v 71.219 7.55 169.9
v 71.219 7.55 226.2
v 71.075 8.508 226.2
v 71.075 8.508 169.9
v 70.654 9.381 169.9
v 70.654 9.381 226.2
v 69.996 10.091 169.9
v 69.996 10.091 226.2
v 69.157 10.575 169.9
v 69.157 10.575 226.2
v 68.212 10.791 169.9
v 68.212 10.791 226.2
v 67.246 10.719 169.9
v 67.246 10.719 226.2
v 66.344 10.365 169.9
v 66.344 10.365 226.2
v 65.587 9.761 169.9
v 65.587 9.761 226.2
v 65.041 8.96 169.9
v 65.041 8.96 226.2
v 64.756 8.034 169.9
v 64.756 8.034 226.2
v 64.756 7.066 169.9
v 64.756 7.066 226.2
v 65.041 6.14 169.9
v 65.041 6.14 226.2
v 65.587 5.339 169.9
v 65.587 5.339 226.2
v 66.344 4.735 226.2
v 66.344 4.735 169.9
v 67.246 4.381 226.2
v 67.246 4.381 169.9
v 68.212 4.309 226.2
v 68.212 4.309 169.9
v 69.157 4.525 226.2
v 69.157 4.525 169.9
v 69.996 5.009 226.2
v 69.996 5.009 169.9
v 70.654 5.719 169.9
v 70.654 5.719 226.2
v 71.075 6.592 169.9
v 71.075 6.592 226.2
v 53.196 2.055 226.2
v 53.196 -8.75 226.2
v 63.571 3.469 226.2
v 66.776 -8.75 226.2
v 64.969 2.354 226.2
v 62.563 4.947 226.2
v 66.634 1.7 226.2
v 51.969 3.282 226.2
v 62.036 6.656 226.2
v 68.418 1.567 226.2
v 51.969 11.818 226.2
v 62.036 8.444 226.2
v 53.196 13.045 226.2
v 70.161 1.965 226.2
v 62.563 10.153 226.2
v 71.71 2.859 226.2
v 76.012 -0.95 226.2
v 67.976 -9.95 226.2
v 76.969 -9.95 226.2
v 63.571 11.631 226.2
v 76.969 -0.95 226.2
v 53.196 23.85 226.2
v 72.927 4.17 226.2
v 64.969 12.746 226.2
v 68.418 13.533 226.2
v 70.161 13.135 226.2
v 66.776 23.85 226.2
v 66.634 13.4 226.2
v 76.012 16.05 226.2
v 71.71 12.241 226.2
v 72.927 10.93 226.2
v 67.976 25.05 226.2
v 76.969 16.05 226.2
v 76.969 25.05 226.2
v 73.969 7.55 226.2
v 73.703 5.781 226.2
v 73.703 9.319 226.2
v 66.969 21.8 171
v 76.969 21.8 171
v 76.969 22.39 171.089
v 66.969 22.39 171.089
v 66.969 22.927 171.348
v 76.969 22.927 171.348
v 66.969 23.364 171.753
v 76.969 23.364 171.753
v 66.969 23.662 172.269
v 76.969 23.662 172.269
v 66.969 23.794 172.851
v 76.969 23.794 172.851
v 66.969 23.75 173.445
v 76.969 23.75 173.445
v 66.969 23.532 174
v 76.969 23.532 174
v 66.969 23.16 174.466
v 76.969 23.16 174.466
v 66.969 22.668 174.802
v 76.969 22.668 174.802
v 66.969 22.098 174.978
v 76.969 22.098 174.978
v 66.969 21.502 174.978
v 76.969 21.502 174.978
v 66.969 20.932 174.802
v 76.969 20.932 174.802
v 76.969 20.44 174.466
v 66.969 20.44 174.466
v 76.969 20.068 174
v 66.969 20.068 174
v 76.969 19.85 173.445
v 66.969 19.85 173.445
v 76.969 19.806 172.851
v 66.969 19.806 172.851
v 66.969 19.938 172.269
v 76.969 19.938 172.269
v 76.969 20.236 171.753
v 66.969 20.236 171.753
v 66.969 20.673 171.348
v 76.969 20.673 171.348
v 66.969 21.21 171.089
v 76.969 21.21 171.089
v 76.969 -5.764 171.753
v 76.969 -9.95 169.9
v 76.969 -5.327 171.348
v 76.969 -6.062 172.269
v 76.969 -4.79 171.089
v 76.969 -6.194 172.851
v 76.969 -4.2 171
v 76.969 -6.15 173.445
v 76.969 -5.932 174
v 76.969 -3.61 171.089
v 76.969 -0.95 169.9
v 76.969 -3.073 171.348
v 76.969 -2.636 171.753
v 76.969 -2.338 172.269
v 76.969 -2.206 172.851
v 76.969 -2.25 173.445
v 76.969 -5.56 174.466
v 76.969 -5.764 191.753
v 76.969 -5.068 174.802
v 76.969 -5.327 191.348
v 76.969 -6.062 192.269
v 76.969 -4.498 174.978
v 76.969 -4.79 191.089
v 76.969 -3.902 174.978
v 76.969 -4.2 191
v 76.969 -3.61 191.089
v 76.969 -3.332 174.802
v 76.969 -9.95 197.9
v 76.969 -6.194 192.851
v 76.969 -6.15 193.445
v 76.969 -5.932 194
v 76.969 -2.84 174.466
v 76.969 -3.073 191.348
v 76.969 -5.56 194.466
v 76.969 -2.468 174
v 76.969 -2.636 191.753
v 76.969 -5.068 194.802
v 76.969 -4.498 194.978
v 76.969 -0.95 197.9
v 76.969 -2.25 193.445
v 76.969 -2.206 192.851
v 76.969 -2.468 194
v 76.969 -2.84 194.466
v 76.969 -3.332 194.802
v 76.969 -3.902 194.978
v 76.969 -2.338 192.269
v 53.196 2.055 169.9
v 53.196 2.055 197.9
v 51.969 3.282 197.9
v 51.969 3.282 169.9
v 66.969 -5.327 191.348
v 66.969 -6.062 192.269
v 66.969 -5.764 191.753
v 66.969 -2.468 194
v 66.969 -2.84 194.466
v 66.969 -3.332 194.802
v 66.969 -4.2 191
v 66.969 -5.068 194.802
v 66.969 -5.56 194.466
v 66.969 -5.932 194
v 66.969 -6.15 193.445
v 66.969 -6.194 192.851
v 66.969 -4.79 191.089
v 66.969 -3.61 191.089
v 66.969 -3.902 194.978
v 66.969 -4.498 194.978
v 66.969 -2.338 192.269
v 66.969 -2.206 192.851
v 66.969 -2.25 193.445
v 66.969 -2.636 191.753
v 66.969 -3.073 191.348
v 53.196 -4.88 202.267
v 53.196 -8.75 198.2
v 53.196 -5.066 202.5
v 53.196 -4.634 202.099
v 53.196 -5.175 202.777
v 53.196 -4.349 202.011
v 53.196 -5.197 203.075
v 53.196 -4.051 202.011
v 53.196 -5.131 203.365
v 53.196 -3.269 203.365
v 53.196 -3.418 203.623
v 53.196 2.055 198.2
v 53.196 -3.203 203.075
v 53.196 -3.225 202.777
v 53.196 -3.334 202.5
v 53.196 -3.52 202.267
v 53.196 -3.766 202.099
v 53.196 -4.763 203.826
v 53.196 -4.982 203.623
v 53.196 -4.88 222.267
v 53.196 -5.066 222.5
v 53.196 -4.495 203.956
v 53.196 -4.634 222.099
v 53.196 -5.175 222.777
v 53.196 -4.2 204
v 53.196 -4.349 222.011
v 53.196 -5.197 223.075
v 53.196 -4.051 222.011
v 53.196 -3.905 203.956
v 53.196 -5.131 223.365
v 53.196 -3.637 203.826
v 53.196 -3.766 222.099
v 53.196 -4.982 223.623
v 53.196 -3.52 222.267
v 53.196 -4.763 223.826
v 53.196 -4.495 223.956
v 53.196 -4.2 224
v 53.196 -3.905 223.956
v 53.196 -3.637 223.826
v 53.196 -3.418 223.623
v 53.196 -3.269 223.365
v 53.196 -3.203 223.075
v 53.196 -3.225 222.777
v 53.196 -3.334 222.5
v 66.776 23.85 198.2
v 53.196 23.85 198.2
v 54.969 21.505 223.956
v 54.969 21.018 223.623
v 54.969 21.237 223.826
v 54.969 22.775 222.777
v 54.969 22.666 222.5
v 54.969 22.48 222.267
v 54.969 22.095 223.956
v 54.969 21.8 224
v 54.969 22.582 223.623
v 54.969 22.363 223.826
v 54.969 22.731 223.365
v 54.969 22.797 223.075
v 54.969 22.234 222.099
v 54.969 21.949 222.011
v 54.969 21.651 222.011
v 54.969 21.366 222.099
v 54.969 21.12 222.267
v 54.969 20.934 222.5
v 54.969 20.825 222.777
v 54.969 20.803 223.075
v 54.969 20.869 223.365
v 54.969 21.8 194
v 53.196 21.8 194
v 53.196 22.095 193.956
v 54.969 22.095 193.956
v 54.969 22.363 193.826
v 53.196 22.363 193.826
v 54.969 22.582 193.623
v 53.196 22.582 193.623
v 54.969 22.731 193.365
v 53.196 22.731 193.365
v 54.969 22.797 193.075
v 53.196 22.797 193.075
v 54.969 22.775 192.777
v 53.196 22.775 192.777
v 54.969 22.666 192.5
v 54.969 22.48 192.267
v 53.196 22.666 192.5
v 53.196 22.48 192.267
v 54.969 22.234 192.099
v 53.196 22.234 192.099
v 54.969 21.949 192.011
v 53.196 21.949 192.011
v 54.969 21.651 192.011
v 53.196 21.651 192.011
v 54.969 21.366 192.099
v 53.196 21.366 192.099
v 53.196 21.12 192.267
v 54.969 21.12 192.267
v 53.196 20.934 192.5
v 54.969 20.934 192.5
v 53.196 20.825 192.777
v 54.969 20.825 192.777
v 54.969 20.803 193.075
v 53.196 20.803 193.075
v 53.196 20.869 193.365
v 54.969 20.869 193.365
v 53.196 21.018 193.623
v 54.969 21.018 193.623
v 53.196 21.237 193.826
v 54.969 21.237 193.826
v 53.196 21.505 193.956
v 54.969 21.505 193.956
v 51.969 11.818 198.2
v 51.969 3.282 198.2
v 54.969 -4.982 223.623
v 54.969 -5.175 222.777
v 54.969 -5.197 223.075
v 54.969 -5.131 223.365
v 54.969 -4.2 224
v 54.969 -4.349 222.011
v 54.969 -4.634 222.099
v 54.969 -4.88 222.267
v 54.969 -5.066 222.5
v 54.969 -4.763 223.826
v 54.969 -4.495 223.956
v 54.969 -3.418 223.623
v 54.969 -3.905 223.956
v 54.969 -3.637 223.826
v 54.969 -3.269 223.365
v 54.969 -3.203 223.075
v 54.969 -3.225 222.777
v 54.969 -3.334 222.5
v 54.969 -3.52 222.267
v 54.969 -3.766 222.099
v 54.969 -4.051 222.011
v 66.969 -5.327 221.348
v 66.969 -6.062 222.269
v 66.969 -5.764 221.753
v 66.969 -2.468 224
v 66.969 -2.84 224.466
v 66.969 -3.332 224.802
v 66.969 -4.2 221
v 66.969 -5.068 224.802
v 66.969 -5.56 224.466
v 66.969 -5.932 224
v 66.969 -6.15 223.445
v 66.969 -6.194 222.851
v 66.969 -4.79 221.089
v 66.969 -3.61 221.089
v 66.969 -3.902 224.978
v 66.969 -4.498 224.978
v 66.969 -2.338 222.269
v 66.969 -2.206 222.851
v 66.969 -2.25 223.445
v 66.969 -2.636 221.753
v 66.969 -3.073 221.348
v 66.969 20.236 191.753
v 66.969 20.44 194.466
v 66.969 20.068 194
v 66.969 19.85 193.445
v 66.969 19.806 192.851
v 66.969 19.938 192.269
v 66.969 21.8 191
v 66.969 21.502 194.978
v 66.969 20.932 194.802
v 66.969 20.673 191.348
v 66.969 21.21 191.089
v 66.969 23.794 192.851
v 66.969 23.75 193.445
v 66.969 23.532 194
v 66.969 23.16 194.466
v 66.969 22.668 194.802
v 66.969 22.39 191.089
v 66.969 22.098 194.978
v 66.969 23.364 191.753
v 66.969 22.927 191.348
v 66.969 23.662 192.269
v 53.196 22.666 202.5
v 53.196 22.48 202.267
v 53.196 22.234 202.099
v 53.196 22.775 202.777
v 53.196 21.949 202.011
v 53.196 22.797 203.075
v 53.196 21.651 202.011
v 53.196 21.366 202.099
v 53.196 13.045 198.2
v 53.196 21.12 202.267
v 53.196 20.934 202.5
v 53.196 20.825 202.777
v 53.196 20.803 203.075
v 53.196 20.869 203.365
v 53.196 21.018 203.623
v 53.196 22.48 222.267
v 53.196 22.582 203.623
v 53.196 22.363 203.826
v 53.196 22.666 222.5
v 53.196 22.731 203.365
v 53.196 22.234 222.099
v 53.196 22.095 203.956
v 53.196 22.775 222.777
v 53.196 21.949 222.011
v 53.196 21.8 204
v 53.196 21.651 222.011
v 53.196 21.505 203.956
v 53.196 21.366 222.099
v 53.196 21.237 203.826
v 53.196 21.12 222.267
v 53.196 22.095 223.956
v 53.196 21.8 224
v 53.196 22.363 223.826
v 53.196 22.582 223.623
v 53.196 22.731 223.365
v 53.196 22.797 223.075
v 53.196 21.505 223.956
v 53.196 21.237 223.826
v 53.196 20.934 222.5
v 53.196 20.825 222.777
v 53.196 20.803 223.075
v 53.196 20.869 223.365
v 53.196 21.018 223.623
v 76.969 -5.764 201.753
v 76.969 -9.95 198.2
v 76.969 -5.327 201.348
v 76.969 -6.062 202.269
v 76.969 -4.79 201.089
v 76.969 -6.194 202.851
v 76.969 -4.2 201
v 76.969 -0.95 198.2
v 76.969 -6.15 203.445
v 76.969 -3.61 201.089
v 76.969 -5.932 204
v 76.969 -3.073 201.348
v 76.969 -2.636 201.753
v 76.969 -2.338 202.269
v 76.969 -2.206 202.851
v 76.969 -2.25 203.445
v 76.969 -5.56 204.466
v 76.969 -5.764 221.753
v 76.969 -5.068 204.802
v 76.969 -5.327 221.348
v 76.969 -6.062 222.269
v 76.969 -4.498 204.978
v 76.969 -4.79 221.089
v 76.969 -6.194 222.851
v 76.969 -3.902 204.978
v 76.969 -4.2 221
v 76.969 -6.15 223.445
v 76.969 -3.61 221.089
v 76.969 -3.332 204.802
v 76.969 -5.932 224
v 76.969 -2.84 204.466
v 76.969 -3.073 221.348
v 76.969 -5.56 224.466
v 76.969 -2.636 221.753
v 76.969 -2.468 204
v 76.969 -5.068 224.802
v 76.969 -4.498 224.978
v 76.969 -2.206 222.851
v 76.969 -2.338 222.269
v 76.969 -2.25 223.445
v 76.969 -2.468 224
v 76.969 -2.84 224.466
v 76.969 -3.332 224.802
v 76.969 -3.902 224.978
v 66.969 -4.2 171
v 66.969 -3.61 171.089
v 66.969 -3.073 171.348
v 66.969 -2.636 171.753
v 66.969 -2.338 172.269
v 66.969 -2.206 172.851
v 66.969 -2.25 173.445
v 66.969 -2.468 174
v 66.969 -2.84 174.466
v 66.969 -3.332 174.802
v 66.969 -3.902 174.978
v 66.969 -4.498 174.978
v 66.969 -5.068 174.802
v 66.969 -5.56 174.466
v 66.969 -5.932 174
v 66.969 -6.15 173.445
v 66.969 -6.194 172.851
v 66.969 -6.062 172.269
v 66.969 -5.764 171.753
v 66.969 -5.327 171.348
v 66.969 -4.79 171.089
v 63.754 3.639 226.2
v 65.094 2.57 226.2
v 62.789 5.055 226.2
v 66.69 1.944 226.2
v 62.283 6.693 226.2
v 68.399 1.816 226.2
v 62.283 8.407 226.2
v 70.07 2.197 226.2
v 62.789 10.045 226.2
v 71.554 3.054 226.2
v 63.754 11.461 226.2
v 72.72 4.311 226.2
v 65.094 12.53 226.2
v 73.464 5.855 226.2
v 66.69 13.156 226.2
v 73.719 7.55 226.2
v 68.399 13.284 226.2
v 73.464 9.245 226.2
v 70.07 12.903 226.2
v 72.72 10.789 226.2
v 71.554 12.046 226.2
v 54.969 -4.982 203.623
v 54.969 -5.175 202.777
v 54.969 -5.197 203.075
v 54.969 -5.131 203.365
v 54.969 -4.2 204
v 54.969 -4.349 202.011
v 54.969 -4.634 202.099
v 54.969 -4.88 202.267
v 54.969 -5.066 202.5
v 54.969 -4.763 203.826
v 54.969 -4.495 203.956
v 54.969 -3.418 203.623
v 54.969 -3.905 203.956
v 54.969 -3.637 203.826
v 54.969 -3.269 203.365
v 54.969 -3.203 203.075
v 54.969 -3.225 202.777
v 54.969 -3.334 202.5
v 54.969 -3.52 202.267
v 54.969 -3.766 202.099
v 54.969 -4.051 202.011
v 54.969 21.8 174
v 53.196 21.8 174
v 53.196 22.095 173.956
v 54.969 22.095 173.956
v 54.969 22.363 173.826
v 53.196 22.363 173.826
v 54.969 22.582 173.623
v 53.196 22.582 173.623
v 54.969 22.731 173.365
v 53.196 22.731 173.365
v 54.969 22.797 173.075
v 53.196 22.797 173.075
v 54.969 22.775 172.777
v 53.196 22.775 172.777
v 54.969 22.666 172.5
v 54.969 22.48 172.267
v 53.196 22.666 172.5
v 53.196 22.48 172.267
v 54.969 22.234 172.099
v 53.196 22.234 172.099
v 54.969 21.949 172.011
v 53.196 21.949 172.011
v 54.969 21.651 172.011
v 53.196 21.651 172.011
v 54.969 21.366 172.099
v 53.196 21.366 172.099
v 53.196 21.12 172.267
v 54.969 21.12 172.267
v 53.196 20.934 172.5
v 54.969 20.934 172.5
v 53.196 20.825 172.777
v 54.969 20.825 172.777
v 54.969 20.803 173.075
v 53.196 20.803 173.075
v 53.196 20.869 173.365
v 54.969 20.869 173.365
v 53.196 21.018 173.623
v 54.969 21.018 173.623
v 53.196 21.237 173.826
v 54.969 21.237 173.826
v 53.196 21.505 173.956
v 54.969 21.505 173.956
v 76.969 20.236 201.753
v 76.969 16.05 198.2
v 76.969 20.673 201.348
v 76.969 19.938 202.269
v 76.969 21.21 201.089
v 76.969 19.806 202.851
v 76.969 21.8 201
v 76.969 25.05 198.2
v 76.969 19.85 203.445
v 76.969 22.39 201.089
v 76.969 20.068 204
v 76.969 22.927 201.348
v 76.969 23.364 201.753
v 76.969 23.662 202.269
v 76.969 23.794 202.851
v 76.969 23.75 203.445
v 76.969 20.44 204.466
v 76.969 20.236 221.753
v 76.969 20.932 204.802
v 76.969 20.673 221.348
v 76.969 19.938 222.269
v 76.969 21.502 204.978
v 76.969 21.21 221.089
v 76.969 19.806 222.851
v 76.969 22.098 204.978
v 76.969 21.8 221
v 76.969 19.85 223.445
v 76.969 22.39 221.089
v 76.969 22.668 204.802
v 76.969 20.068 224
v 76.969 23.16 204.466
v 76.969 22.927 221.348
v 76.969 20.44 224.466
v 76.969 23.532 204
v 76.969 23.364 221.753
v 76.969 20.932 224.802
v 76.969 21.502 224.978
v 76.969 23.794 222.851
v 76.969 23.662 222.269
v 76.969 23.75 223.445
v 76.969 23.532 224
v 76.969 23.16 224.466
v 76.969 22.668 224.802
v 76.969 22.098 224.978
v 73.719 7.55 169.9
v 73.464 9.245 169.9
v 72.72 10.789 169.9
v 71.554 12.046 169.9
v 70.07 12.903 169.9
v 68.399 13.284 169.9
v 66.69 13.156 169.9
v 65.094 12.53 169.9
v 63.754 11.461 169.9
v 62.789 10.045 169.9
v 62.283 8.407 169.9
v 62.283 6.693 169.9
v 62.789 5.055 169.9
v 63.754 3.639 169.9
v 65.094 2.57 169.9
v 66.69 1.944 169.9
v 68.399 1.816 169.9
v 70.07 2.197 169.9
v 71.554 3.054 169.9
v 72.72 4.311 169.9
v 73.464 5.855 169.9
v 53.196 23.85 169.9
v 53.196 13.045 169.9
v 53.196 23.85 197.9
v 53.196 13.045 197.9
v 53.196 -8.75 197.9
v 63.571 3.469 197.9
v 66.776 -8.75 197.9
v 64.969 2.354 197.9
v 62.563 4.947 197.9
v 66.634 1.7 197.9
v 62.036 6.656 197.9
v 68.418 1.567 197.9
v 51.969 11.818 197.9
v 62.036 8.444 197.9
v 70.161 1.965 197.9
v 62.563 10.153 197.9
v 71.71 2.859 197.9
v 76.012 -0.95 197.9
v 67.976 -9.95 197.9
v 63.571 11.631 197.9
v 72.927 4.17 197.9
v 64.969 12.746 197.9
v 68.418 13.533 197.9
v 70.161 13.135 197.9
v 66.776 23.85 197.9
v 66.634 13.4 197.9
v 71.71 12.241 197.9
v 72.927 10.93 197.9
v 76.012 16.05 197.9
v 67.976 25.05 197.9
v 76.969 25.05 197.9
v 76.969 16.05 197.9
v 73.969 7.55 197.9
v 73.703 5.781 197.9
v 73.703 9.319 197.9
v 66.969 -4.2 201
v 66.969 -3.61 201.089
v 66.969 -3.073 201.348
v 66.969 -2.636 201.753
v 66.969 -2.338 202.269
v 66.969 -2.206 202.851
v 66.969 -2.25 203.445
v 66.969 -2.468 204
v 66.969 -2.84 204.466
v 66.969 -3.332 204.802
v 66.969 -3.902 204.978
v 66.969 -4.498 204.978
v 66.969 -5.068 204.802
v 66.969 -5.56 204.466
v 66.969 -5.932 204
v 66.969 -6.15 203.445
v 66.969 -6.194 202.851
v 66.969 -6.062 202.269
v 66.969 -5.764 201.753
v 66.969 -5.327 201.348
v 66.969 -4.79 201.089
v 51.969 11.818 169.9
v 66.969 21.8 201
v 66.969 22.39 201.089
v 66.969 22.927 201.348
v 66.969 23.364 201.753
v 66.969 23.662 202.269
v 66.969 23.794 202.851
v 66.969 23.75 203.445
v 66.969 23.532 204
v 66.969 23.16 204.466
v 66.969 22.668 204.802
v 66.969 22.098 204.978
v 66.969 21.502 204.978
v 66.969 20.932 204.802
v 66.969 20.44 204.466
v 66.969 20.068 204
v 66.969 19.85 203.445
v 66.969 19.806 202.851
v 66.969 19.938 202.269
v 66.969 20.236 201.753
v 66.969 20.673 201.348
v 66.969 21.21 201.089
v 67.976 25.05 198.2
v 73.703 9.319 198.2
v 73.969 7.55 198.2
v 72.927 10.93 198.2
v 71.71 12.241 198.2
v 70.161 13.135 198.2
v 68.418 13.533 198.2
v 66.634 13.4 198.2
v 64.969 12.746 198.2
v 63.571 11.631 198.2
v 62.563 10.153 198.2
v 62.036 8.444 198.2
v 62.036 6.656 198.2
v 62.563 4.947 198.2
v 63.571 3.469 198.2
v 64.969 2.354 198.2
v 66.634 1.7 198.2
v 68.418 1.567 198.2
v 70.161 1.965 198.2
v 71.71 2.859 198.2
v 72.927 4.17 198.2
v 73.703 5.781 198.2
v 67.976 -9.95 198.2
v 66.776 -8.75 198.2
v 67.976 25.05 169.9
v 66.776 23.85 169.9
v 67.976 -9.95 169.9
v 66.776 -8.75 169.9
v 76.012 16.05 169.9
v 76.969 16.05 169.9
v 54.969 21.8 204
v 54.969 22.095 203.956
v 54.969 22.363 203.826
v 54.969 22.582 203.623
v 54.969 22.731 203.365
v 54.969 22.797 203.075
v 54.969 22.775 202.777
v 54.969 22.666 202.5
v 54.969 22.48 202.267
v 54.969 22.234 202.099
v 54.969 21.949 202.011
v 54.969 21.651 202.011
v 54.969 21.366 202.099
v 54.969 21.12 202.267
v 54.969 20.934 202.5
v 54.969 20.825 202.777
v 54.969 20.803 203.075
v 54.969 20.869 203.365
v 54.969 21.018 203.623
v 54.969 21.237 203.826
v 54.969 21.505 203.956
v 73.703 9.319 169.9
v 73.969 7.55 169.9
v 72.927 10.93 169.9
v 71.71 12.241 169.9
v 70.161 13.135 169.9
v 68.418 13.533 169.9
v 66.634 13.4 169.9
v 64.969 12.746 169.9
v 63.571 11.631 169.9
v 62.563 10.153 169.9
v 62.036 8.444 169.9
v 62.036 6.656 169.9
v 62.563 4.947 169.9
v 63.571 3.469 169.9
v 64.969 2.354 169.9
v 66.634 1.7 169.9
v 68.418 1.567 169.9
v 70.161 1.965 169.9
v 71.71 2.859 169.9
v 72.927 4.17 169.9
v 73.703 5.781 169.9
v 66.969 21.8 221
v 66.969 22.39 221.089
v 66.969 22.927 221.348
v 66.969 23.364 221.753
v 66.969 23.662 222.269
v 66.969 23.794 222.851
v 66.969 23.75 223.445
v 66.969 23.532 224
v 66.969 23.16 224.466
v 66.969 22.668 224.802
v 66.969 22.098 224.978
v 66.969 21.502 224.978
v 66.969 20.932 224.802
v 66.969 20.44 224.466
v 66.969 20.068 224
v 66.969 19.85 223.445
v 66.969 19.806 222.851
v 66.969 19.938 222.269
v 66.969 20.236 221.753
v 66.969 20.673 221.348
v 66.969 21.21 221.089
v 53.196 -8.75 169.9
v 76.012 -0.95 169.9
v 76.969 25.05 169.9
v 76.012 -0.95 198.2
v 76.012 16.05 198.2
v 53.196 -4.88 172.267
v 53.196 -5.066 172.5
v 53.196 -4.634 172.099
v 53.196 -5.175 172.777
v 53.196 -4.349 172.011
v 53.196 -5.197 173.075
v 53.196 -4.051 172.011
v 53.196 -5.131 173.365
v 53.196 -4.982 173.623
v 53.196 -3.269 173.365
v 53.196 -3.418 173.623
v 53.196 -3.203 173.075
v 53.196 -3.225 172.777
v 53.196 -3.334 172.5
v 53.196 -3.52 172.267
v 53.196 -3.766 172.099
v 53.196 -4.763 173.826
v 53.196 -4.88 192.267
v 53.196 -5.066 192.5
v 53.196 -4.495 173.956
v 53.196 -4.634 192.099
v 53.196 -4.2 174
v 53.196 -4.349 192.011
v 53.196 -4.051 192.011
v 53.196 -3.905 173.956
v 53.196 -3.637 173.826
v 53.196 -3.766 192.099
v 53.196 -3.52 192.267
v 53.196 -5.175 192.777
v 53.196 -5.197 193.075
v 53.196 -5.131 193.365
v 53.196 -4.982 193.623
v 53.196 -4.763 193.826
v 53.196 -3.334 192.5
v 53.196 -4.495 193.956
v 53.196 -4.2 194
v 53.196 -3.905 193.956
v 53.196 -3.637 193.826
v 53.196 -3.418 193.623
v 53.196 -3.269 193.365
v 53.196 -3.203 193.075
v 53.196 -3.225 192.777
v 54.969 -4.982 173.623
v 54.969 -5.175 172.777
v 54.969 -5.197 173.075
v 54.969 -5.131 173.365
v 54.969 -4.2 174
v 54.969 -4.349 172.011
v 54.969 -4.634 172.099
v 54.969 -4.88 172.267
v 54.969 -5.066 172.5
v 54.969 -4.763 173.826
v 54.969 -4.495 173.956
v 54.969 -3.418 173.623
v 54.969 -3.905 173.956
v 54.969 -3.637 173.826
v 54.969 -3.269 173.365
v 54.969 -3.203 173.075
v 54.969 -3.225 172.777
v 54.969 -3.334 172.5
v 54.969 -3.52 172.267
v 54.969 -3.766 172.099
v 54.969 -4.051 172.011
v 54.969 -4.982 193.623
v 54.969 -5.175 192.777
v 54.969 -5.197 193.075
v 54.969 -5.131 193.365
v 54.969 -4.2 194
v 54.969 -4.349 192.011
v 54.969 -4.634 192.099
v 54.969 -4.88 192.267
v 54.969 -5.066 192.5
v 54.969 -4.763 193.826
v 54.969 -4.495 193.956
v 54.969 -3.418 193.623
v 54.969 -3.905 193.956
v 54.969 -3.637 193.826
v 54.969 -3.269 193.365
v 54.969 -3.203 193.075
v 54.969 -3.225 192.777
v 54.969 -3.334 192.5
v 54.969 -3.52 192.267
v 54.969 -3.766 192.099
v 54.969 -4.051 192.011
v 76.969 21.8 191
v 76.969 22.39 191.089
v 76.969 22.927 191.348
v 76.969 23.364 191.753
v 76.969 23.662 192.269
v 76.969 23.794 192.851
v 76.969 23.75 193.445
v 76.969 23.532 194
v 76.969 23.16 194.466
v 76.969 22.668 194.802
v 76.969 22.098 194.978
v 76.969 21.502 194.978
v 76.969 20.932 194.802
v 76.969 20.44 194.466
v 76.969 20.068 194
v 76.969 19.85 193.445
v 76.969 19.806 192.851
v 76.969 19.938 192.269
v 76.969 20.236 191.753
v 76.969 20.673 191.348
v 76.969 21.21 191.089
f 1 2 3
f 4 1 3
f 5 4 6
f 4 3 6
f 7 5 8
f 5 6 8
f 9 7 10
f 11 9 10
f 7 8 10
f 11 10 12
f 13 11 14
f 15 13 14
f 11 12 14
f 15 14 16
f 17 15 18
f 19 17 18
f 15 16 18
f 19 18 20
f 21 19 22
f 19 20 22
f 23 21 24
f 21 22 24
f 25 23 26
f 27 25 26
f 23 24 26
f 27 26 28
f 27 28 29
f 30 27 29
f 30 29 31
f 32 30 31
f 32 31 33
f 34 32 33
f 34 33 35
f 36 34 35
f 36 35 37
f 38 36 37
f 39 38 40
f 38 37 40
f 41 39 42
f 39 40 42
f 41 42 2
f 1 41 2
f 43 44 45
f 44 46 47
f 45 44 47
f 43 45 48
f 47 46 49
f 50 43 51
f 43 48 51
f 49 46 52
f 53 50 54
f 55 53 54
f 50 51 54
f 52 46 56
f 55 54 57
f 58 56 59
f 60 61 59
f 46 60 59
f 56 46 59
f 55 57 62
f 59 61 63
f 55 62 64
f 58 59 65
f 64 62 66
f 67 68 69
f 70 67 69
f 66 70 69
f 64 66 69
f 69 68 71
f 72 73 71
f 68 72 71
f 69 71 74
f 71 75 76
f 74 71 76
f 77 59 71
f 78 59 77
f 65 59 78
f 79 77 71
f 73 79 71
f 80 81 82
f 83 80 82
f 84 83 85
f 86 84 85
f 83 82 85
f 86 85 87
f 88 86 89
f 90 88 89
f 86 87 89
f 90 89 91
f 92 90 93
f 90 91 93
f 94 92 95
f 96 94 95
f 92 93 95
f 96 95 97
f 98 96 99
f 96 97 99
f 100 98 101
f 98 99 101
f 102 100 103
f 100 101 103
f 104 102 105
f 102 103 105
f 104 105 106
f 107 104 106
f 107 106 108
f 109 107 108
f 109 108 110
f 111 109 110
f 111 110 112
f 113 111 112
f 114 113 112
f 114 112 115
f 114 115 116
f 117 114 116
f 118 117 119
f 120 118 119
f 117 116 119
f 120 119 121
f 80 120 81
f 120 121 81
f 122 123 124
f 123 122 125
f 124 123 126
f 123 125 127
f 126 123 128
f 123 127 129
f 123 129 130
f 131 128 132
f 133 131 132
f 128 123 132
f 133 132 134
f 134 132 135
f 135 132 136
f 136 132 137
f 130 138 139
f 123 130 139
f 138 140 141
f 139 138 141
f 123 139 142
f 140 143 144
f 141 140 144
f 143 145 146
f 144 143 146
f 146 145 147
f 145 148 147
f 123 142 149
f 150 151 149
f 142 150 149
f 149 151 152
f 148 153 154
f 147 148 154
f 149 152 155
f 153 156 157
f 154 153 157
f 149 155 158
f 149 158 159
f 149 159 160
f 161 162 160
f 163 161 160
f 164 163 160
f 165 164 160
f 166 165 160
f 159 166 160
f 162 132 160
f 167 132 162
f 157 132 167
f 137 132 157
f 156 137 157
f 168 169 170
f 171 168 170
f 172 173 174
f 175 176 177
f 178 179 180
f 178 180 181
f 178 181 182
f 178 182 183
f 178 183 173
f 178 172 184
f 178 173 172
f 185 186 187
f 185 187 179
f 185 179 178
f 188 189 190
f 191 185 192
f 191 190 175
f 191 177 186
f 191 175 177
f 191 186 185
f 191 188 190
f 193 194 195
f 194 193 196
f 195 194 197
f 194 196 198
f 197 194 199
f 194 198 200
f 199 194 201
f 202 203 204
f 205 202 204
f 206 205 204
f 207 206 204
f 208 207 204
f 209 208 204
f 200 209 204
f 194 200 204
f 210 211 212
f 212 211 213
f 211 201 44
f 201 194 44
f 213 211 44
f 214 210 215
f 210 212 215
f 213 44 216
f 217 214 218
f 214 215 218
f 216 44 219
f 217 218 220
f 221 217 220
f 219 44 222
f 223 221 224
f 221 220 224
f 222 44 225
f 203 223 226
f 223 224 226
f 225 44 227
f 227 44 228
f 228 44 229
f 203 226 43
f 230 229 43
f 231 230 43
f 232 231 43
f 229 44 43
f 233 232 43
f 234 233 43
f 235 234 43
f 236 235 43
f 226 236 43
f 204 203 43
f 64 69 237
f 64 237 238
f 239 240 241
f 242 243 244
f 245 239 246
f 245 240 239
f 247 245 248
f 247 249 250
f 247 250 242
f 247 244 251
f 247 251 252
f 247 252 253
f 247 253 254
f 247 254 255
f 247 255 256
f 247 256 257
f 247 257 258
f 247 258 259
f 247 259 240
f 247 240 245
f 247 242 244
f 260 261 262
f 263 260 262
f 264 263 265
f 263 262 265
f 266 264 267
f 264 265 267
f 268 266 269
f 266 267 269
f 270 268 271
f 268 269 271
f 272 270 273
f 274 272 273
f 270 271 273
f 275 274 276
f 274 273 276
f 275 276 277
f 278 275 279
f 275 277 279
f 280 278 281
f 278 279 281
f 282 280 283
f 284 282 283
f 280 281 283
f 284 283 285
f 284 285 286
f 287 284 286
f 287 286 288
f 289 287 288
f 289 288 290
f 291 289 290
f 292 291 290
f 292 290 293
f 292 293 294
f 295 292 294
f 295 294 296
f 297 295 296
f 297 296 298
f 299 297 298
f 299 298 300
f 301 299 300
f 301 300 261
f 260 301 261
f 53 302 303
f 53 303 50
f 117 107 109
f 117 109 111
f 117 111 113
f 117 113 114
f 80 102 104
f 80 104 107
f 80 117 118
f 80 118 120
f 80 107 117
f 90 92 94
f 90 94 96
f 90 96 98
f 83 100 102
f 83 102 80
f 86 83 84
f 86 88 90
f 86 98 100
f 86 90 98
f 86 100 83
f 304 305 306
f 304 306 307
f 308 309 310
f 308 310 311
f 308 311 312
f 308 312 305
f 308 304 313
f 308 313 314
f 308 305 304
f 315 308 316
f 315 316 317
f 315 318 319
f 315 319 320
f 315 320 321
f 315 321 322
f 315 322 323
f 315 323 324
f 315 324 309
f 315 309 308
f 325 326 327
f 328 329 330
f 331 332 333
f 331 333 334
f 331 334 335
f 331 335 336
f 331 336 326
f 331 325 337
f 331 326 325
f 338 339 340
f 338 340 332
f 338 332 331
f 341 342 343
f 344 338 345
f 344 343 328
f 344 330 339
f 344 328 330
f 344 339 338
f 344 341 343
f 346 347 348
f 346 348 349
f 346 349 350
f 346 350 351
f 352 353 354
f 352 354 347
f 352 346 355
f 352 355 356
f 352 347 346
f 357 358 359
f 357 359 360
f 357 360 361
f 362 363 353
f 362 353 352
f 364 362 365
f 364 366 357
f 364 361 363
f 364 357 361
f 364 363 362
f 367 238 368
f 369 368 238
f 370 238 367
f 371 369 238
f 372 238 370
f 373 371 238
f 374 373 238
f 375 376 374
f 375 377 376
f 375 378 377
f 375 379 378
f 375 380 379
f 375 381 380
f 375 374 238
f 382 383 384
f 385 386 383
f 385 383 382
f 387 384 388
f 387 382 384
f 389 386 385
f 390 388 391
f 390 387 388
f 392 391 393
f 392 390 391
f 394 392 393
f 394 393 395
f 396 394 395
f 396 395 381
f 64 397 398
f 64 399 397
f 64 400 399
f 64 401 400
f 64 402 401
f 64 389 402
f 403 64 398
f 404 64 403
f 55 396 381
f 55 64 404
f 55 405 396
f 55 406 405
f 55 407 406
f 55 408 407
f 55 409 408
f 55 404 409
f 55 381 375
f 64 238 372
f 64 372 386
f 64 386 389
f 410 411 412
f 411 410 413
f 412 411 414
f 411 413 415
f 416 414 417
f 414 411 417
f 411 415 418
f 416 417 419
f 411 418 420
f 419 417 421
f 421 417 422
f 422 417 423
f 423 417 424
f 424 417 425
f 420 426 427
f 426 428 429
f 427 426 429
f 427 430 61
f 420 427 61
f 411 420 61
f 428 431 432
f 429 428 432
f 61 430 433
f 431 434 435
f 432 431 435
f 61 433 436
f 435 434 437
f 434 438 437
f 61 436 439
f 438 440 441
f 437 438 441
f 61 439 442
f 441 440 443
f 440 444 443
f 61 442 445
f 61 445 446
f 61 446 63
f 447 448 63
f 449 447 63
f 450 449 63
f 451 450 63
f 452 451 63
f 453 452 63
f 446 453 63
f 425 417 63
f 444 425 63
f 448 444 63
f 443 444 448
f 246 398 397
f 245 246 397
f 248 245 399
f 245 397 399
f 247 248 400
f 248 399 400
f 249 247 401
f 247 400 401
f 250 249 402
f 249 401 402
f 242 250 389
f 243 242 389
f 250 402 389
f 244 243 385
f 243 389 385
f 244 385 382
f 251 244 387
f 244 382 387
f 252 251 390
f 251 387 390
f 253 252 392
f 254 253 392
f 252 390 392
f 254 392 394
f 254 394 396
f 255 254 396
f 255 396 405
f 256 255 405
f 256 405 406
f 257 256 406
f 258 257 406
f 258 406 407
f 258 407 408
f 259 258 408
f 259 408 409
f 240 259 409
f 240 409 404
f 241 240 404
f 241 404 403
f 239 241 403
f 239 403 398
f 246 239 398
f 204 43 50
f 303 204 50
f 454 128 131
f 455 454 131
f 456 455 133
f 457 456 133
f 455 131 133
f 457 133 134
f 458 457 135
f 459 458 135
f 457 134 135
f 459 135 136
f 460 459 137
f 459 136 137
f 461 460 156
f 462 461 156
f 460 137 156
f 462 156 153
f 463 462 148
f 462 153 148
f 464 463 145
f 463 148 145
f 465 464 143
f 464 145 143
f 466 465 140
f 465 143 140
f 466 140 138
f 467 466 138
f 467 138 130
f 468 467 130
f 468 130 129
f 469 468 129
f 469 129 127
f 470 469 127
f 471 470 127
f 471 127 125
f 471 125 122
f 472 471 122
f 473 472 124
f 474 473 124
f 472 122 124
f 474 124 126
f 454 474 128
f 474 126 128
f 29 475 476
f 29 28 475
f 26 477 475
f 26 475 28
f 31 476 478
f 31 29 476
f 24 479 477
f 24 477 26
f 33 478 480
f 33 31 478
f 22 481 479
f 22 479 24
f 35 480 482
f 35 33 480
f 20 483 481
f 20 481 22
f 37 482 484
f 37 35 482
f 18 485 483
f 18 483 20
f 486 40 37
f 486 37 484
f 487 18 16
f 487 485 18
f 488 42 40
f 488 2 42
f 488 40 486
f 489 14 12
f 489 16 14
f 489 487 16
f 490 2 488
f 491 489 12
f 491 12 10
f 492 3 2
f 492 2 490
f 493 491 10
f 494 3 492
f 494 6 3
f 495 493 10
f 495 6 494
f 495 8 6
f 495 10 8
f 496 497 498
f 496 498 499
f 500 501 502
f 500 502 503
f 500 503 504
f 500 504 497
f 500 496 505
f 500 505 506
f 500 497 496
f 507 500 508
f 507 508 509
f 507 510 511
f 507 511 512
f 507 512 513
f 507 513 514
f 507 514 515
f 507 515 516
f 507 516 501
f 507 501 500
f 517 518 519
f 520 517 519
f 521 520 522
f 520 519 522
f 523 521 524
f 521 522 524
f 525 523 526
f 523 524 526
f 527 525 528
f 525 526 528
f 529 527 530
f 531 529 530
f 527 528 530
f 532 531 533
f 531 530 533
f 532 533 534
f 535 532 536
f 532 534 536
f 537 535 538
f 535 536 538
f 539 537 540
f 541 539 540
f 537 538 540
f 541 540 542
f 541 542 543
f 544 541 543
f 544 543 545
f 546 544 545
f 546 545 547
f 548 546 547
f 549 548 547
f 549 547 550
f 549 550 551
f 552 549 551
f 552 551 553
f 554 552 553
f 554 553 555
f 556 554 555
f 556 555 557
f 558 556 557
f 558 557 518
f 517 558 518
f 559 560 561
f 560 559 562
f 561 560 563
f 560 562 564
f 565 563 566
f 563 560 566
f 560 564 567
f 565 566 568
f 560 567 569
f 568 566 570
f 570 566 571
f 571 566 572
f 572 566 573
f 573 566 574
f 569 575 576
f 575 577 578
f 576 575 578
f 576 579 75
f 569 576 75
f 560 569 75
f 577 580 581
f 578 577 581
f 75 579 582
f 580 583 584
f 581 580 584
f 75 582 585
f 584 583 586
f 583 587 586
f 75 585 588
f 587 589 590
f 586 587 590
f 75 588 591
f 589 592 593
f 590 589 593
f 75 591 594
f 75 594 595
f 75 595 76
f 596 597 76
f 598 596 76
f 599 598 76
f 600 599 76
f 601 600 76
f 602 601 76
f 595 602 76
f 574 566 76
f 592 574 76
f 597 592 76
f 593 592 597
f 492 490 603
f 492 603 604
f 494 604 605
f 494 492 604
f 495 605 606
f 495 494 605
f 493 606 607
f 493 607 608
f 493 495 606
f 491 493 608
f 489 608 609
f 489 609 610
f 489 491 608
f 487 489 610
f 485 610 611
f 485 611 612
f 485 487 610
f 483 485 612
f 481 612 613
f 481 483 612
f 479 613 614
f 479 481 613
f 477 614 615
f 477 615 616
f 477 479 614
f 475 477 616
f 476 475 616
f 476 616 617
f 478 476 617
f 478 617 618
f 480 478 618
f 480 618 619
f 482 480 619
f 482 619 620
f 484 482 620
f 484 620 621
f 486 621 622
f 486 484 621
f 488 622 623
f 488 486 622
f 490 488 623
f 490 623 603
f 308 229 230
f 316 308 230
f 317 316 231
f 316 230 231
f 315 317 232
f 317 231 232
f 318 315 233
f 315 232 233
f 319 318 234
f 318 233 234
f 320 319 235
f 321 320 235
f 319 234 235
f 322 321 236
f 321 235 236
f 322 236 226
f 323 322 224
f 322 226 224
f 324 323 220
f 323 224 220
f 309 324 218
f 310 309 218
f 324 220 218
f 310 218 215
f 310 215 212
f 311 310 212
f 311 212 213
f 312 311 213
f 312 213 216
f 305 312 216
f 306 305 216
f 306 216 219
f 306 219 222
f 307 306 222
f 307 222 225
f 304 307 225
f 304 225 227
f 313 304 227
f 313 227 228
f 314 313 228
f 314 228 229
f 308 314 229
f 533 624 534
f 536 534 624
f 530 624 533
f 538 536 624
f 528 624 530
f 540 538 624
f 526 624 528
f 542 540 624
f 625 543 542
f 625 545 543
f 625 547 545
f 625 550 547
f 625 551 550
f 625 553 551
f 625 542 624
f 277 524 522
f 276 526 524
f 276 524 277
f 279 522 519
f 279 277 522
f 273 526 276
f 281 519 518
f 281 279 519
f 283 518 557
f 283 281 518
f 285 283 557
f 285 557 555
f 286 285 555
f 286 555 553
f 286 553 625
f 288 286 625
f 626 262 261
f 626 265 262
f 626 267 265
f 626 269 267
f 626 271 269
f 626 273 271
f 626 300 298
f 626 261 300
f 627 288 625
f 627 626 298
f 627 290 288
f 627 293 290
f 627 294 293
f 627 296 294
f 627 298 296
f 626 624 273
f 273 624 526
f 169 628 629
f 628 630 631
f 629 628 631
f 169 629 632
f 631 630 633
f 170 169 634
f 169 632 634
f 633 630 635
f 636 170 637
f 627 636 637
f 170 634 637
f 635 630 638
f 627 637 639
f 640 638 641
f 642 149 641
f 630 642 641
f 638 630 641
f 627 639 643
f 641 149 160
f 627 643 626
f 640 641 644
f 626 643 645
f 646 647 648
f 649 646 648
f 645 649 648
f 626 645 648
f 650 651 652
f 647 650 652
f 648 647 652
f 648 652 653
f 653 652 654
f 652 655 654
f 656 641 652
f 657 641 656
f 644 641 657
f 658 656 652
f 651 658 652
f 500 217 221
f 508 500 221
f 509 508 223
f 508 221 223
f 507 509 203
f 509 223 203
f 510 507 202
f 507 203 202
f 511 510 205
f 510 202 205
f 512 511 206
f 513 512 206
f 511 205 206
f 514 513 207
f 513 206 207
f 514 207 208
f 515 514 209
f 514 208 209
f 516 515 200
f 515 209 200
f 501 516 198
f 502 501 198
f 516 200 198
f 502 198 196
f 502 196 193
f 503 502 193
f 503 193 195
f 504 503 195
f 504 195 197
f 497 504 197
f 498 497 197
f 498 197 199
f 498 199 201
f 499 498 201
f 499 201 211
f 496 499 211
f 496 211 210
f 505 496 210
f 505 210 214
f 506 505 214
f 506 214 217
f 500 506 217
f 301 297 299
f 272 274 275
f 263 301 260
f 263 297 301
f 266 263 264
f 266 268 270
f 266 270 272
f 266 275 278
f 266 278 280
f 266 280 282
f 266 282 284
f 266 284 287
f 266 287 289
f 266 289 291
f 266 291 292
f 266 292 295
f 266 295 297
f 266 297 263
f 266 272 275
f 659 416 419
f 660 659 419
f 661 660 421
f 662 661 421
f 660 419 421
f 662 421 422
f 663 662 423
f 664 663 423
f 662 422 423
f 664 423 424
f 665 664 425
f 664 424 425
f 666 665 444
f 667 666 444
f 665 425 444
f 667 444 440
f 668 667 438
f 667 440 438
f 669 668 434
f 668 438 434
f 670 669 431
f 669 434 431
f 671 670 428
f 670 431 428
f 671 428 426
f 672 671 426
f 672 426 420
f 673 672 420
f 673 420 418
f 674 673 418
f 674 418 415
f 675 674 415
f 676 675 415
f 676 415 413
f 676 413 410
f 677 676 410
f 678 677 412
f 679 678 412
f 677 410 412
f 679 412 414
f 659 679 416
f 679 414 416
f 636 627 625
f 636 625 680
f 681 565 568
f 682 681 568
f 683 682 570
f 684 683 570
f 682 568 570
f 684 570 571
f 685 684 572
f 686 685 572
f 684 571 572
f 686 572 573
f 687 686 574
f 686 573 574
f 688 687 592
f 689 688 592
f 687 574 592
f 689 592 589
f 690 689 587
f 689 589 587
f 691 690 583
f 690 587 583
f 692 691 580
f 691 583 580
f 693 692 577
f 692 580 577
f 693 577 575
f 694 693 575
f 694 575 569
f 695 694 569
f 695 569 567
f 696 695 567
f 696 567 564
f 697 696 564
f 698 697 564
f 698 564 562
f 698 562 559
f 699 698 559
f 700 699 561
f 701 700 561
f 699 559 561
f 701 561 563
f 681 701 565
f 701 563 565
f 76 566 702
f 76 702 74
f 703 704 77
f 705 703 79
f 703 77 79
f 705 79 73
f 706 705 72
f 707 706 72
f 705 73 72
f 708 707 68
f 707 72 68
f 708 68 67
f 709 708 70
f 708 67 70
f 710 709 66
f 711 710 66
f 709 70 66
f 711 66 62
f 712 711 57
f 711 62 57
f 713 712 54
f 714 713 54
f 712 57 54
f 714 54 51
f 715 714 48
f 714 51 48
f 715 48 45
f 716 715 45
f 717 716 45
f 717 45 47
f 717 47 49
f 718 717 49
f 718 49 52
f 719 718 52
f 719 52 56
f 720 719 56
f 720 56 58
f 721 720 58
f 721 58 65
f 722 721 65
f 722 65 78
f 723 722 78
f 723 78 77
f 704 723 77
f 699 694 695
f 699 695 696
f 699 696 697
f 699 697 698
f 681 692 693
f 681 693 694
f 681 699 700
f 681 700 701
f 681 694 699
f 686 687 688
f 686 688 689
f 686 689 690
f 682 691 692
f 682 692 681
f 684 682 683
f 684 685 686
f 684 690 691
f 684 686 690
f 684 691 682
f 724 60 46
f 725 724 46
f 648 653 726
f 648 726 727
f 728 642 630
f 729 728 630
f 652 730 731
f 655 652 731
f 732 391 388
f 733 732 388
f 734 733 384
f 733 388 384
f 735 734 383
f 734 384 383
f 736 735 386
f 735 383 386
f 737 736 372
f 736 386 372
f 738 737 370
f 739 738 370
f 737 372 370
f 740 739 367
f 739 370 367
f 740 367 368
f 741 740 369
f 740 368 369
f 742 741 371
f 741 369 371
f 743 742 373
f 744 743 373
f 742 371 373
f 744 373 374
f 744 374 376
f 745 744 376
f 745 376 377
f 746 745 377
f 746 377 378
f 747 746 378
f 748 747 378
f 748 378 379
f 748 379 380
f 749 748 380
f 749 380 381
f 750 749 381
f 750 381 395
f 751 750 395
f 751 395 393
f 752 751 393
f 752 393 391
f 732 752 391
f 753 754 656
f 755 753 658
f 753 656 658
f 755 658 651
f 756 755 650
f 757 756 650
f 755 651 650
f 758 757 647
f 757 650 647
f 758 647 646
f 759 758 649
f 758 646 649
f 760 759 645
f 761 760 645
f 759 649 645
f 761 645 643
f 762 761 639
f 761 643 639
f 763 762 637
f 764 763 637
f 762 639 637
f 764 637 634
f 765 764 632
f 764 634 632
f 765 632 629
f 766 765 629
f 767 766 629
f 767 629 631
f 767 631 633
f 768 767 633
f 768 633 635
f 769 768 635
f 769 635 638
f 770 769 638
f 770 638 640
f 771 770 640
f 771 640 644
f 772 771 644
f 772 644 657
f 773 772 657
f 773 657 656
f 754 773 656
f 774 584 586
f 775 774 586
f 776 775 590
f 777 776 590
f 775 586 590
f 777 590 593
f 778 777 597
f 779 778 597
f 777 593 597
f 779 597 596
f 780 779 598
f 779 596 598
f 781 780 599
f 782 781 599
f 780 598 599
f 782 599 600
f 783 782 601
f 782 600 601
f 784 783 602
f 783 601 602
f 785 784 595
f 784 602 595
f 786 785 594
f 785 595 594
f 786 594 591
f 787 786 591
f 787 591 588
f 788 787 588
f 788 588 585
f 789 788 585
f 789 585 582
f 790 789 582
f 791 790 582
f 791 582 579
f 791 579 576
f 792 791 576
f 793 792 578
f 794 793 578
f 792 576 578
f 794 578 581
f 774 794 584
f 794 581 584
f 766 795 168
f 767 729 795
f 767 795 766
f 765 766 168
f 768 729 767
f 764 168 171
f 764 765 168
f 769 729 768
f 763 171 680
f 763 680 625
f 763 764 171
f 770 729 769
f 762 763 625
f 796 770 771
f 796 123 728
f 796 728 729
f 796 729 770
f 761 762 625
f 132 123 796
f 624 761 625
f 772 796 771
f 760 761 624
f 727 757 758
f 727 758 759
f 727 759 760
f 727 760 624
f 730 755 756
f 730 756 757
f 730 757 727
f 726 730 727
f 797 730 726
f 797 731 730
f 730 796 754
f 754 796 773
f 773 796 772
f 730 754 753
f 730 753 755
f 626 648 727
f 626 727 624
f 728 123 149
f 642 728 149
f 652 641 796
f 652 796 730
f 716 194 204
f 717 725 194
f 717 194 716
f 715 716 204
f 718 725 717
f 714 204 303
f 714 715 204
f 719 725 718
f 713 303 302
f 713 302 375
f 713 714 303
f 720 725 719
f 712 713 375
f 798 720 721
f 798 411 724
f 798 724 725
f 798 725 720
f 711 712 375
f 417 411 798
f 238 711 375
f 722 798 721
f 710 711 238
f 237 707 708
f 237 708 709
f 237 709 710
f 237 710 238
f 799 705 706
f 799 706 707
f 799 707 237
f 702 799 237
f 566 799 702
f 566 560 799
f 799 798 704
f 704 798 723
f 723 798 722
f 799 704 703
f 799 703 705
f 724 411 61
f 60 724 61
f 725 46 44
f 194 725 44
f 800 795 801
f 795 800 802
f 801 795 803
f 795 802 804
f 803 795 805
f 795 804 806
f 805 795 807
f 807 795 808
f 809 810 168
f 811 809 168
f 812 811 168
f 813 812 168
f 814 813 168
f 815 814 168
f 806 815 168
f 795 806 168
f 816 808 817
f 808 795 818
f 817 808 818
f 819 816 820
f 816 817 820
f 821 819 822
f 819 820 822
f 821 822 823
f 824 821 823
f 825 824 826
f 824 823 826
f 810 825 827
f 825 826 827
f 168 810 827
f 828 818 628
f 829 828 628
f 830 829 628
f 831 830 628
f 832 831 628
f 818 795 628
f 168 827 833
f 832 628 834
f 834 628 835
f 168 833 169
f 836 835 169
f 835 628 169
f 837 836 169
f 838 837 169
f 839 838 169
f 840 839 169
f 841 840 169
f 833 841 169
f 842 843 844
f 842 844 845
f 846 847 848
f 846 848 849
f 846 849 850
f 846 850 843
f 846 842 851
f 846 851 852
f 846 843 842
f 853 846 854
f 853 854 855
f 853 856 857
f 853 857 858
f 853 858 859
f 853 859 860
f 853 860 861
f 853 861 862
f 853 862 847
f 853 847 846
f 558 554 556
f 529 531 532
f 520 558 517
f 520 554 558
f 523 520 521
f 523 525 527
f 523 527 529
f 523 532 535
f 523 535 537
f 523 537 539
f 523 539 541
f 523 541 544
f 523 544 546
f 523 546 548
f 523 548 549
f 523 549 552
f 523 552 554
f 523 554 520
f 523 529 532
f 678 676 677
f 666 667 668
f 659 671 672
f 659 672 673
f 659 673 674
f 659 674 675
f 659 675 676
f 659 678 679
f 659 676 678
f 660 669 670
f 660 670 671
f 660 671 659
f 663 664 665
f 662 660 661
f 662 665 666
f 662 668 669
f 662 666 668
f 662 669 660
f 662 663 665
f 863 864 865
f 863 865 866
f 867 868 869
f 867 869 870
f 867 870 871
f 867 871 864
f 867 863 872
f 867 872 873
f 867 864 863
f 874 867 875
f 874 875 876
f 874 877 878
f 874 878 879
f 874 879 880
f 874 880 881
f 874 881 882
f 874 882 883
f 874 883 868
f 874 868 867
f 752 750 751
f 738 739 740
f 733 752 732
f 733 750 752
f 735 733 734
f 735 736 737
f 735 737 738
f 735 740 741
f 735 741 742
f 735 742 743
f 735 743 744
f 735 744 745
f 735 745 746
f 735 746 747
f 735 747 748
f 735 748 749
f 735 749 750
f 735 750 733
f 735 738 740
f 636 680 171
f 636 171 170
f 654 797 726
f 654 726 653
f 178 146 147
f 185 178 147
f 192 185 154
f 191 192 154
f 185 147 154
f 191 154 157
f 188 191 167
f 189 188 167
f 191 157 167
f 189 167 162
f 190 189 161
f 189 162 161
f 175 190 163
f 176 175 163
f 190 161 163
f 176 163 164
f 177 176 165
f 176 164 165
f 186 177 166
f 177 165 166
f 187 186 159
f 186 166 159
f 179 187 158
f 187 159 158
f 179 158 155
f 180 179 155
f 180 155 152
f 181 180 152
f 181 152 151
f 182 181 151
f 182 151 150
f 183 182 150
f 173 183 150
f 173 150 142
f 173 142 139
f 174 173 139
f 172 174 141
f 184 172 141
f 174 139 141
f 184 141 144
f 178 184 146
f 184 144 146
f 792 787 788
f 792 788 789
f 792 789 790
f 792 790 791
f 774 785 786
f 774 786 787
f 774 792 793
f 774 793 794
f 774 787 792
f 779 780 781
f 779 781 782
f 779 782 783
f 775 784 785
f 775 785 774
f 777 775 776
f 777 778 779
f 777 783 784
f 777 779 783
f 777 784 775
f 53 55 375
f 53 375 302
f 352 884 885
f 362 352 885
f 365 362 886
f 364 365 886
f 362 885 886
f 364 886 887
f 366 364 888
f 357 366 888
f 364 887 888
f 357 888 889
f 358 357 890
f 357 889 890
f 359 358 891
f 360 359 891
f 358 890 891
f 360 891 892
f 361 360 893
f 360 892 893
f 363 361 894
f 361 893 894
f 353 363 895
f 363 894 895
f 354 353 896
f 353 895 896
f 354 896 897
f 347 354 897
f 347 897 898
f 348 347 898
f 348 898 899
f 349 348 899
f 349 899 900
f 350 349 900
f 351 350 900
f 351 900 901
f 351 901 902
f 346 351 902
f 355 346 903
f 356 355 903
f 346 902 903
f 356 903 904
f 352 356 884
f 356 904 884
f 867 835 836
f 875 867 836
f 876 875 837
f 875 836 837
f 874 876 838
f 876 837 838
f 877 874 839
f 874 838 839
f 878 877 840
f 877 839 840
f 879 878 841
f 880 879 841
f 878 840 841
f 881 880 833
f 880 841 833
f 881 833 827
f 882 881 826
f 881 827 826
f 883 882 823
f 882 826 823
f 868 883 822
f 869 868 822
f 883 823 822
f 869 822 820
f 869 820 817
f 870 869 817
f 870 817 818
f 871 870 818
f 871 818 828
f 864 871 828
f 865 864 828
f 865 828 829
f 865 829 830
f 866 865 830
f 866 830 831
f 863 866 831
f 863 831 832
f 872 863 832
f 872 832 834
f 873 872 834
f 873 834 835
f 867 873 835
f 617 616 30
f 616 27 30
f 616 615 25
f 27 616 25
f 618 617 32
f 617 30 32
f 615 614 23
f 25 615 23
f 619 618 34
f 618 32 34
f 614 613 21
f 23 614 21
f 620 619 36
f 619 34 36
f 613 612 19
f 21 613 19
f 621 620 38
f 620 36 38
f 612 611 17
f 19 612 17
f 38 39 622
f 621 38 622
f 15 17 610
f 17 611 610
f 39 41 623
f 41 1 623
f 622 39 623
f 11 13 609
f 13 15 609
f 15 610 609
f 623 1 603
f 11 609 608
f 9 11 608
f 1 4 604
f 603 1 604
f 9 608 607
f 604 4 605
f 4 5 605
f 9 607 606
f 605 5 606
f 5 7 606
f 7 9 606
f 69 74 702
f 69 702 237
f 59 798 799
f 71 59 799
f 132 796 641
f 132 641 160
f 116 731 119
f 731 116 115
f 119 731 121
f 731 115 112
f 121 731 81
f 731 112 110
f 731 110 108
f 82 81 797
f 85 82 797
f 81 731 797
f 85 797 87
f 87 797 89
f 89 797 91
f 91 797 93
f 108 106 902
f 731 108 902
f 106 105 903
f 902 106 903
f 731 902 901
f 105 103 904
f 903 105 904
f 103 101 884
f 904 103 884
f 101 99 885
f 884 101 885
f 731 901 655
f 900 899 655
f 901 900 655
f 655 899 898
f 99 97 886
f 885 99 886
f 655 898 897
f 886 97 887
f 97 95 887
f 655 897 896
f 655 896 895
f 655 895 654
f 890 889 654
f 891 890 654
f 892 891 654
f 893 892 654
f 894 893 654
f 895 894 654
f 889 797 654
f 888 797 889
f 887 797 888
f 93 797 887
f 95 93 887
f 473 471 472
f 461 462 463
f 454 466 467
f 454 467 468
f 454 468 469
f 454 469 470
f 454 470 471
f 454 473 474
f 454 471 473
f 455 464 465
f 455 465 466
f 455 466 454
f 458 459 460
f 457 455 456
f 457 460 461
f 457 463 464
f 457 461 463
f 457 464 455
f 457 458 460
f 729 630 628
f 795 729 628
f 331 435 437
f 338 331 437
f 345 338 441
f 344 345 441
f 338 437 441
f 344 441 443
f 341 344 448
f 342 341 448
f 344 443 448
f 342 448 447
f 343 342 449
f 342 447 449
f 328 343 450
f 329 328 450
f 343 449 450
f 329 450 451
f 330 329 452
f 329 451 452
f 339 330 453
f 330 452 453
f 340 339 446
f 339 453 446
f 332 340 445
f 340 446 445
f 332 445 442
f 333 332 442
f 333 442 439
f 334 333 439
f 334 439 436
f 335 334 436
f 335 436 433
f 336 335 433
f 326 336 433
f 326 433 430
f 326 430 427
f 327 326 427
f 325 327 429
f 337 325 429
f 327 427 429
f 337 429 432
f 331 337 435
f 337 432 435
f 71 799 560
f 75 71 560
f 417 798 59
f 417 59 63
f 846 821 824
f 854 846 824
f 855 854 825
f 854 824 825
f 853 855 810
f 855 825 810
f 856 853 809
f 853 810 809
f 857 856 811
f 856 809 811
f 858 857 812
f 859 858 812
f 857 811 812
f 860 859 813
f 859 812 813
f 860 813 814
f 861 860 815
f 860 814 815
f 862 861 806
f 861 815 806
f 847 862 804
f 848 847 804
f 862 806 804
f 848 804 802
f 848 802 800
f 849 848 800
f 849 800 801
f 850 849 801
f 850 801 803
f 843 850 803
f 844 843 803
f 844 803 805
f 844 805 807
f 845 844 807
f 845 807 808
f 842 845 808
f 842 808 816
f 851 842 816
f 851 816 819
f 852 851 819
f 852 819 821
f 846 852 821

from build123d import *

# Parameters (mm, degrees)
SKETCH1_W             = 28
SKETCH1_H             = 35
BOSS_EXTRUDE1_DEPTH   = 25
BOSS_EXTRUDE1_2_DEPTH = 25
SKETCH4_R             = 2
CUT_EXTRUDE1_DEPTH    = 10
SKETCH5_R             = 1
CUT_EXTRUDE2_DEPTH    = 3
SKETCH6_R             = 6
CUT_EXTRUDE3_DEPTH    = 82
SKETCH7_W             = 0.957204126
SKETCH7_H             = 17
CUT_EXTRUDE4_DEPTH    = 82
CUT_EXTRUDE5_DEPTH    = 82
SKETCH9_R             = 5.75
SKETCH9_R_2           = 3.25
BOSS_EXTRUDE2_DEPTH   = 56.3


with BuildPart() as part:
    # Sketch1 → Boss-Extrude1 (new body)
    with BuildSketch(Plane.ZY.offset(-76.969208633)):
        with Locations((212.2, 7.55)):
            Rectangle(SKETCH1_W, SKETCH1_H)
    extrude(amount=BOSS_EXTRUDE1_DEPTH)


with BuildPart() as body_2:
    # Sketch1 → Boss-Extrude1 2 (new body)
    with BuildSketch(Plane.ZY.offset(-76.969208633)):
        with Locations((183.9, 7.55)):
            Rectangle(SKETCH1_W, SKETCH1_H)
    extrude(amount=BOSS_EXTRUDE1_2_DEPTH)


with BuildPart() as cut_extrude1_tool:
    # Sketch4 → Cut-Extrude1 (new body)
    with BuildSketch(Plane(origin=(76.969208633, 0, 0), x_dir=(0, 0, -1), z_dir=(1, 0, 0))):
        with Locations((-193, 21.8)):
            Circle(SKETCH4_R)
        with Locations((-173, 21.8)):
            Circle(SKETCH4_R)
        with Locations((-173, -4.2)):
            Circle(SKETCH4_R)
        with Locations((-193, -4.2)):
            Circle(SKETCH4_R)
        with Locations((-223, -4.2)):
            Circle(SKETCH4_R)
        with Locations((-203, -4.2)):
            Circle(SKETCH4_R)
        with Locations((-203, 21.8)):
            Circle(SKETCH4_R)
        with Locations((-223, 21.8)):
            Circle(SKETCH4_R)
    extrude(amount=-CUT_EXTRUDE1_DEPTH)


with BuildPart() as part_1:
    add(part.part)

    # Cut-Extrude1: cut by cut_extrude1_tool
    add(cut_extrude1_tool.part, mode=Mode.SUBTRACT)


with BuildPart() as body_2_1:
    add(body_2.part)

    # Cut-Extrude1: cut by cut_extrude1_tool
    add(cut_extrude1_tool.part, mode=Mode.SUBTRACT)


with BuildPart() as cut_extrude2_tool:
    # Sketch5 → Cut-Extrude2 (new body)
    with BuildSketch(Plane.ZY.offset(-51.969208633)):
        with Locations((223, 21.8)):
            Circle(SKETCH5_R)
        with Locations((223, -4.2)):
            Circle(SKETCH5_R)
        with Locations((203, -4.2)):
            Circle(SKETCH5_R)
        with Locations((203, 21.8)):
            Circle(SKETCH5_R)
        with Locations((193, 21.8)):
            Circle(SKETCH5_R)
        with Locations((193, -4.2)):
            Circle(SKETCH5_R)
        with Locations((173, -4.2)):
            Circle(SKETCH5_R)
        with Locations((173, 21.8)):
            Circle(SKETCH5_R)
    extrude(amount=-CUT_EXTRUDE2_DEPTH)


with BuildPart() as part_2:
    add(part_1.part)

    # Cut-Extrude2: cut by cut_extrude2_tool
    add(cut_extrude2_tool.part, mode=Mode.SUBTRACT)


with BuildPart() as body_2_2:
    add(body_2_1.part)

    # Cut-Extrude2: cut by cut_extrude2_tool
    add(cut_extrude2_tool.part, mode=Mode.SUBTRACT)


with BuildPart() as cut_extrude3_tool:
    # Sketch6 → Cut-Extrude3 (new body)
    with BuildSketch(Plane.XY.offset(226.2)):
        with Locations((67.969208633, 7.55)):
            Circle(SKETCH6_R)
    extrude(amount=-CUT_EXTRUDE3_DEPTH)


with BuildPart() as part_3:
    add(part_2.part)

    # Cut-Extrude3: cut by cut_extrude3_tool
    add(cut_extrude3_tool.part, mode=Mode.SUBTRACT)


with BuildPart() as body_2_3:
    add(body_2_2.part)

    # Cut-Extrude3: cut by cut_extrude3_tool
    add(cut_extrude3_tool.part, mode=Mode.SUBTRACT)


with BuildPart() as cut_extrude4_tool:
    # Sketch7 → Cut-Extrude4 (new body)
    with BuildSketch(Plane.XY.offset(226.2)):
        with Locations((76.49060657, 7.55)):
            Rectangle(SKETCH7_W, SKETCH7_H)
    extrude(amount=-CUT_EXTRUDE4_DEPTH)


with BuildPart() as part_4:
    add(part_3.part)

    # Cut-Extrude4: cut by cut_extrude4_tool
    add(cut_extrude4_tool.part, mode=Mode.SUBTRACT)


with BuildPart() as body_2_4:
    add(body_2_3.part)

    # Cut-Extrude4: cut by cut_extrude4_tool
    add(cut_extrude4_tool.part, mode=Mode.SUBTRACT)


with BuildPart() as cut_extrude5_tool:
    # Sketch8 → Cut-Extrude5 (new body)
    with BuildSketch(Plane.XY.offset(226.2)):
        Polygon((67.976384402, 25.05), (66.776384402, 23.85), (53.195802703, 23.85), (53.195802703, 13.044895511), (51.969208633, 11.818301441), (51.969208633, 25.05), align=None)
        Polygon((53.195802703, 2.055104489), (51.969208633, 3.281698559), (51.969208633, -9.95), (67.976384402, -9.95), (66.776384402, -8.75), (53.195802703, -8.75), align=None)
    extrude(amount=-CUT_EXTRUDE5_DEPTH)


with BuildPart() as part_5:
    add(part_4.part)

    # Cut-Extrude5: cut by cut_extrude5_tool
    add(cut_extrude5_tool.part, mode=Mode.SUBTRACT)


with BuildPart() as body_2_5:
    add(body_2_4.part)

    # Cut-Extrude5: cut by cut_extrude5_tool
    add(cut_extrude5_tool.part, mode=Mode.SUBTRACT)


with BuildPart() as body_3:
    # Sketch9 → Boss-Extrude2 (new body)
    with BuildSketch(Plane.XY.offset(226.2)):
        with Locations((67.969208633, 7.55)):
            Circle(SKETCH9_R)
        with Locations((67.969208633, 7.55)):
            Circle(SKETCH9_R_2, mode=Mode.SUBTRACT)
    extrude(amount=-BOSS_EXTRUDE2_DEPTH)


solid = Compound([part_5.part, body_2_5.part, body_3.part])
